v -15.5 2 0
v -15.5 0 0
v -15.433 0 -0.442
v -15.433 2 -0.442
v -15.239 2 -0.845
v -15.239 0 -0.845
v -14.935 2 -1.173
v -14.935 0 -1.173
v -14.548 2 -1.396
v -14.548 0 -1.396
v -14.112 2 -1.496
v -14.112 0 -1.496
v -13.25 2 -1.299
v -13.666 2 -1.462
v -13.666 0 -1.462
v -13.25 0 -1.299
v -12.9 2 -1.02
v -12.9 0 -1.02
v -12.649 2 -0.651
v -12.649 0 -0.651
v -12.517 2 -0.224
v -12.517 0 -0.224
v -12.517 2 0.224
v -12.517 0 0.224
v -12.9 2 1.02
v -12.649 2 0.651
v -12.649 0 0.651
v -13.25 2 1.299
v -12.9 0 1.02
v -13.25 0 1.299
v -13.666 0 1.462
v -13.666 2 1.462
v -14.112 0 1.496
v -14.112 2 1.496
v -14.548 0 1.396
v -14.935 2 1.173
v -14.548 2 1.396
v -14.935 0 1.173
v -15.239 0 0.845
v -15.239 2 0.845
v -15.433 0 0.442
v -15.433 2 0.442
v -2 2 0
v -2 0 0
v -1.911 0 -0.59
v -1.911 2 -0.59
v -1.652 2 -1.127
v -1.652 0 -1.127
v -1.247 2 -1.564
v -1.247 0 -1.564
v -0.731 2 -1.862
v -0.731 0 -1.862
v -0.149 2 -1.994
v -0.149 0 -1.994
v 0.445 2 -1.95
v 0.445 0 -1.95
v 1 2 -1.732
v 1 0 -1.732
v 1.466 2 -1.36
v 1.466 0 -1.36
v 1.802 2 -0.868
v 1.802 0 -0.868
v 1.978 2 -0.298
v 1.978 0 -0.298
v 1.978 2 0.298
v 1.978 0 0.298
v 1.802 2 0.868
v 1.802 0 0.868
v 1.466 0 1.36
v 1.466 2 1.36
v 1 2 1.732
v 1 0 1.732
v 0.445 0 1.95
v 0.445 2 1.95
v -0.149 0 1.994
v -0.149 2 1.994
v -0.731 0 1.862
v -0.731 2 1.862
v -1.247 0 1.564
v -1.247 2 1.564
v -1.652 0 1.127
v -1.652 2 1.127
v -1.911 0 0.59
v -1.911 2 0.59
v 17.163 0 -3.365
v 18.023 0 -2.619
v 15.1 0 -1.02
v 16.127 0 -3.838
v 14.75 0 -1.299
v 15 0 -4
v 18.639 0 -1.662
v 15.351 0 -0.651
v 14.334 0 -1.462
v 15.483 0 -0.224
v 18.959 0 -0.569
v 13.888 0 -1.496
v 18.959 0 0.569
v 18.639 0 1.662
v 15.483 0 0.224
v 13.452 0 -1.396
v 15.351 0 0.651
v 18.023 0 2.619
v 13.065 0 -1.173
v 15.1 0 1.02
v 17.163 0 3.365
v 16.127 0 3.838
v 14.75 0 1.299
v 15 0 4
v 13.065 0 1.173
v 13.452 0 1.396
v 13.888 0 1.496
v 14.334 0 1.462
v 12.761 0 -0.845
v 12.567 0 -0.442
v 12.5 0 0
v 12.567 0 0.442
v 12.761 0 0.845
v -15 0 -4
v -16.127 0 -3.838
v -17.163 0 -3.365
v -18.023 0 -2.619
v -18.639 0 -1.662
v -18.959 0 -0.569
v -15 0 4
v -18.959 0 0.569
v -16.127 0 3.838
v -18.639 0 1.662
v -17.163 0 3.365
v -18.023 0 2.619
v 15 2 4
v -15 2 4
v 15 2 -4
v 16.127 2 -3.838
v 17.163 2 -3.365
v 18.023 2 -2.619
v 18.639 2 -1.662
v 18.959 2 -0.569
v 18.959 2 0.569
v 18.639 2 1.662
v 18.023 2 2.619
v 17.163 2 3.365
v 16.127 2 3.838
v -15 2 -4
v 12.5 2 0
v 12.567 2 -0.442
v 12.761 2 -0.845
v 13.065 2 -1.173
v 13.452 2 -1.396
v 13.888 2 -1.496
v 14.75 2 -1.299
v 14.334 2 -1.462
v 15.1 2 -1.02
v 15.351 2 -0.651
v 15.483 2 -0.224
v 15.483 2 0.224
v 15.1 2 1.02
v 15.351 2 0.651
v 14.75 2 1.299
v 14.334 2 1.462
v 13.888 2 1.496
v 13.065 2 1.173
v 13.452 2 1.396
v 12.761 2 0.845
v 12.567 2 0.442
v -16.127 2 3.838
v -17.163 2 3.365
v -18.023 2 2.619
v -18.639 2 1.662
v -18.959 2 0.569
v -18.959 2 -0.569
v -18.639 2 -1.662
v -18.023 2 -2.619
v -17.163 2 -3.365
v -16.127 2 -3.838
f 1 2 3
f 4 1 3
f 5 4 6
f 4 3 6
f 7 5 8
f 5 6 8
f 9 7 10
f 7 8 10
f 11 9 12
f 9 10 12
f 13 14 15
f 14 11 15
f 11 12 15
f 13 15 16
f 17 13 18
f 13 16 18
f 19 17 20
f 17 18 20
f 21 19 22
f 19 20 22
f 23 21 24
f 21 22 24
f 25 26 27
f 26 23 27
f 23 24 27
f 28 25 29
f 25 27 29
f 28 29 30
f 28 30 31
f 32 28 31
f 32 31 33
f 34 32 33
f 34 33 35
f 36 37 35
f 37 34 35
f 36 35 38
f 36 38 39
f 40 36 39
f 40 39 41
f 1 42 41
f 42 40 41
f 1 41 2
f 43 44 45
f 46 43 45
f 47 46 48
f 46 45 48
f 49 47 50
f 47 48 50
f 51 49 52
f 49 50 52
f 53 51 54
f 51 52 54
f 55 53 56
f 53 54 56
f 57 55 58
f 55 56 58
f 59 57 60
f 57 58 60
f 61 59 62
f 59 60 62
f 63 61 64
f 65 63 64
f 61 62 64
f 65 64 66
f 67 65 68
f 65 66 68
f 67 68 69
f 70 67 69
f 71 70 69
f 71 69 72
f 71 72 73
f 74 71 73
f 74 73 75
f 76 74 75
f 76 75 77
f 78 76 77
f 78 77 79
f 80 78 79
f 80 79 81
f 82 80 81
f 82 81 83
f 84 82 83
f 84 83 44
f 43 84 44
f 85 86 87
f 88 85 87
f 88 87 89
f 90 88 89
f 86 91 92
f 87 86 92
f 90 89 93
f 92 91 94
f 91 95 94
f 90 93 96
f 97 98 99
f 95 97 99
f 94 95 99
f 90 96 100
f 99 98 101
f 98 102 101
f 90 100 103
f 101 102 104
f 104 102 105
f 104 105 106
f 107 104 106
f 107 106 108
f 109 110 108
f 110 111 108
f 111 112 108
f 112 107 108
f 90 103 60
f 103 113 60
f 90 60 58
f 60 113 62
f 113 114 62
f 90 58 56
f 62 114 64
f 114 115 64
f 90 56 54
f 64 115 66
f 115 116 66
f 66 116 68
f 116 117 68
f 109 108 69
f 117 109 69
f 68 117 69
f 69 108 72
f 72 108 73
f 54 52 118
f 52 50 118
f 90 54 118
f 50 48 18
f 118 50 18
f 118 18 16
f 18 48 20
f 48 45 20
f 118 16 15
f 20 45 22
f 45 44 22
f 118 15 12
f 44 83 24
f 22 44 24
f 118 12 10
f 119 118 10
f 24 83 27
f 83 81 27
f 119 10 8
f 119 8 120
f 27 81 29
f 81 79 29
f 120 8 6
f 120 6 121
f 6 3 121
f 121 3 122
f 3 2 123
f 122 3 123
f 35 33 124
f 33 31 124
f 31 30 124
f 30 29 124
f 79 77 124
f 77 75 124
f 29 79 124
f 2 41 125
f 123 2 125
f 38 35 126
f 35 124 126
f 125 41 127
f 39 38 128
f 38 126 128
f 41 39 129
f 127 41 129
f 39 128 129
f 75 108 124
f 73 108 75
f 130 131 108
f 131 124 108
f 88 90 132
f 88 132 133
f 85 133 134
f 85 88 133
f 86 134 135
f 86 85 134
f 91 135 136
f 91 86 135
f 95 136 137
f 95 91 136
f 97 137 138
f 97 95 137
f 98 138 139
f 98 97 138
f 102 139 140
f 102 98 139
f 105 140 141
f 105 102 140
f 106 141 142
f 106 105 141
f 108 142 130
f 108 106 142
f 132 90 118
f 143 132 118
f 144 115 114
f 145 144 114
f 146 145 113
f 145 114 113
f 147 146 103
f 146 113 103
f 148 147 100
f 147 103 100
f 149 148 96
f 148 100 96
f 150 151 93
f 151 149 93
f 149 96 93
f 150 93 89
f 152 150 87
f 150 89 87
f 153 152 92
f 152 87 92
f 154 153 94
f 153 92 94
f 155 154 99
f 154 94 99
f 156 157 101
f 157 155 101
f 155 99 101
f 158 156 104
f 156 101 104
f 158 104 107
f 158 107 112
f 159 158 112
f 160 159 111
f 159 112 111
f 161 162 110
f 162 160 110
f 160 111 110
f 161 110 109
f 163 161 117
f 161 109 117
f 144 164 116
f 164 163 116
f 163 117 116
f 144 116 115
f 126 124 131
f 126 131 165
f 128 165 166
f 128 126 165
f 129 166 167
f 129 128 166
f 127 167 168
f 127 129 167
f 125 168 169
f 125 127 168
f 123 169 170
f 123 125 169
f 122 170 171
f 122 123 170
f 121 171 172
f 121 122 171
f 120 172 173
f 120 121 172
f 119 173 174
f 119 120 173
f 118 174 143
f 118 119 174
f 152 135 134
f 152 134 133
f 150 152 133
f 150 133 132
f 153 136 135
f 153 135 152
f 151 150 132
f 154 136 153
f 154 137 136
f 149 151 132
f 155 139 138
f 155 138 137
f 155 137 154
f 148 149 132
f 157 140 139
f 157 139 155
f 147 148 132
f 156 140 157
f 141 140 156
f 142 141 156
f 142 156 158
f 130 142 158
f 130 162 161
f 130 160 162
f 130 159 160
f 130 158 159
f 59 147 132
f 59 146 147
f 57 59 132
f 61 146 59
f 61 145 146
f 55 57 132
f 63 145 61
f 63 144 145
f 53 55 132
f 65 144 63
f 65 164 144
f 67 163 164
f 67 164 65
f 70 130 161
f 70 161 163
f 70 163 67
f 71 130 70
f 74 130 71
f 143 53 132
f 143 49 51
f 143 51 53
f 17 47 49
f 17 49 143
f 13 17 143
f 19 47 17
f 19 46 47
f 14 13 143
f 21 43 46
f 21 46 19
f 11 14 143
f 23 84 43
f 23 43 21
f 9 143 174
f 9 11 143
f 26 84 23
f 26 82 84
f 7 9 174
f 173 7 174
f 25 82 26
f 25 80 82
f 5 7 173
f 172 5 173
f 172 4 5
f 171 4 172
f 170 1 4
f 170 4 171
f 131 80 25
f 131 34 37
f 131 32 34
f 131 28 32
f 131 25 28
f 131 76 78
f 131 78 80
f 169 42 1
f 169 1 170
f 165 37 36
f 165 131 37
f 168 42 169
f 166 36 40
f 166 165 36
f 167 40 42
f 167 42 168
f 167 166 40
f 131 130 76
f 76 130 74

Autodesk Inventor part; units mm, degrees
ref_plane "YZ Plane" through (0, 0, 0) normal (1, 0, 0) x (0, 1, 0)
ref_plane "XZ Plane" through (0, 0, 0) normal (0, 1, 0) x (-1, 0, 0)
ref_plane "XY Plane" through (0, 0, 0) normal (0, 0, 1) x (1, 0, 0)
sketch "Boceto1" plane through (0, 0, 0) normal (0, 1, 0) x (-1, 0, 0)
  circle A0 centre (14, 0) radius 1.5
  circle A1 centre (-14, 0) radius 1.5
  line L0 (15, 0) -> (-15, 0) construction
  line L1 (15, 4) -> (-15, 4)
  line L2 (-15, -4) -> (15, -4)
  arc A2 (15, -4) -> (15, 4) centre (15, 0) ccw
  arc A3 (-15, 4) -> (-15, -4) centre (-15, 0) ccw
  line L3 (0, -5.6) -> (0, 5.6) projected
  circle A4 centre (0, 0) radius 2
  dimension "d2" = 3
  dimension "d3" = 3
  dimension "d4" = 14
  dimension "d5" = 0
  dimension "d6" = 0
  dimension "d7" = 28
  dimension "d8" = 4
  dimension "d9" = 15
  dimension "d12" = 4
extrude "Extrusión2" add sketch "Boceto1" along normal blind 2 contours A2 L2 L3 A4 L1 | L3 A4 L2 A3 L1
properties part number "PINZA_UNION"
